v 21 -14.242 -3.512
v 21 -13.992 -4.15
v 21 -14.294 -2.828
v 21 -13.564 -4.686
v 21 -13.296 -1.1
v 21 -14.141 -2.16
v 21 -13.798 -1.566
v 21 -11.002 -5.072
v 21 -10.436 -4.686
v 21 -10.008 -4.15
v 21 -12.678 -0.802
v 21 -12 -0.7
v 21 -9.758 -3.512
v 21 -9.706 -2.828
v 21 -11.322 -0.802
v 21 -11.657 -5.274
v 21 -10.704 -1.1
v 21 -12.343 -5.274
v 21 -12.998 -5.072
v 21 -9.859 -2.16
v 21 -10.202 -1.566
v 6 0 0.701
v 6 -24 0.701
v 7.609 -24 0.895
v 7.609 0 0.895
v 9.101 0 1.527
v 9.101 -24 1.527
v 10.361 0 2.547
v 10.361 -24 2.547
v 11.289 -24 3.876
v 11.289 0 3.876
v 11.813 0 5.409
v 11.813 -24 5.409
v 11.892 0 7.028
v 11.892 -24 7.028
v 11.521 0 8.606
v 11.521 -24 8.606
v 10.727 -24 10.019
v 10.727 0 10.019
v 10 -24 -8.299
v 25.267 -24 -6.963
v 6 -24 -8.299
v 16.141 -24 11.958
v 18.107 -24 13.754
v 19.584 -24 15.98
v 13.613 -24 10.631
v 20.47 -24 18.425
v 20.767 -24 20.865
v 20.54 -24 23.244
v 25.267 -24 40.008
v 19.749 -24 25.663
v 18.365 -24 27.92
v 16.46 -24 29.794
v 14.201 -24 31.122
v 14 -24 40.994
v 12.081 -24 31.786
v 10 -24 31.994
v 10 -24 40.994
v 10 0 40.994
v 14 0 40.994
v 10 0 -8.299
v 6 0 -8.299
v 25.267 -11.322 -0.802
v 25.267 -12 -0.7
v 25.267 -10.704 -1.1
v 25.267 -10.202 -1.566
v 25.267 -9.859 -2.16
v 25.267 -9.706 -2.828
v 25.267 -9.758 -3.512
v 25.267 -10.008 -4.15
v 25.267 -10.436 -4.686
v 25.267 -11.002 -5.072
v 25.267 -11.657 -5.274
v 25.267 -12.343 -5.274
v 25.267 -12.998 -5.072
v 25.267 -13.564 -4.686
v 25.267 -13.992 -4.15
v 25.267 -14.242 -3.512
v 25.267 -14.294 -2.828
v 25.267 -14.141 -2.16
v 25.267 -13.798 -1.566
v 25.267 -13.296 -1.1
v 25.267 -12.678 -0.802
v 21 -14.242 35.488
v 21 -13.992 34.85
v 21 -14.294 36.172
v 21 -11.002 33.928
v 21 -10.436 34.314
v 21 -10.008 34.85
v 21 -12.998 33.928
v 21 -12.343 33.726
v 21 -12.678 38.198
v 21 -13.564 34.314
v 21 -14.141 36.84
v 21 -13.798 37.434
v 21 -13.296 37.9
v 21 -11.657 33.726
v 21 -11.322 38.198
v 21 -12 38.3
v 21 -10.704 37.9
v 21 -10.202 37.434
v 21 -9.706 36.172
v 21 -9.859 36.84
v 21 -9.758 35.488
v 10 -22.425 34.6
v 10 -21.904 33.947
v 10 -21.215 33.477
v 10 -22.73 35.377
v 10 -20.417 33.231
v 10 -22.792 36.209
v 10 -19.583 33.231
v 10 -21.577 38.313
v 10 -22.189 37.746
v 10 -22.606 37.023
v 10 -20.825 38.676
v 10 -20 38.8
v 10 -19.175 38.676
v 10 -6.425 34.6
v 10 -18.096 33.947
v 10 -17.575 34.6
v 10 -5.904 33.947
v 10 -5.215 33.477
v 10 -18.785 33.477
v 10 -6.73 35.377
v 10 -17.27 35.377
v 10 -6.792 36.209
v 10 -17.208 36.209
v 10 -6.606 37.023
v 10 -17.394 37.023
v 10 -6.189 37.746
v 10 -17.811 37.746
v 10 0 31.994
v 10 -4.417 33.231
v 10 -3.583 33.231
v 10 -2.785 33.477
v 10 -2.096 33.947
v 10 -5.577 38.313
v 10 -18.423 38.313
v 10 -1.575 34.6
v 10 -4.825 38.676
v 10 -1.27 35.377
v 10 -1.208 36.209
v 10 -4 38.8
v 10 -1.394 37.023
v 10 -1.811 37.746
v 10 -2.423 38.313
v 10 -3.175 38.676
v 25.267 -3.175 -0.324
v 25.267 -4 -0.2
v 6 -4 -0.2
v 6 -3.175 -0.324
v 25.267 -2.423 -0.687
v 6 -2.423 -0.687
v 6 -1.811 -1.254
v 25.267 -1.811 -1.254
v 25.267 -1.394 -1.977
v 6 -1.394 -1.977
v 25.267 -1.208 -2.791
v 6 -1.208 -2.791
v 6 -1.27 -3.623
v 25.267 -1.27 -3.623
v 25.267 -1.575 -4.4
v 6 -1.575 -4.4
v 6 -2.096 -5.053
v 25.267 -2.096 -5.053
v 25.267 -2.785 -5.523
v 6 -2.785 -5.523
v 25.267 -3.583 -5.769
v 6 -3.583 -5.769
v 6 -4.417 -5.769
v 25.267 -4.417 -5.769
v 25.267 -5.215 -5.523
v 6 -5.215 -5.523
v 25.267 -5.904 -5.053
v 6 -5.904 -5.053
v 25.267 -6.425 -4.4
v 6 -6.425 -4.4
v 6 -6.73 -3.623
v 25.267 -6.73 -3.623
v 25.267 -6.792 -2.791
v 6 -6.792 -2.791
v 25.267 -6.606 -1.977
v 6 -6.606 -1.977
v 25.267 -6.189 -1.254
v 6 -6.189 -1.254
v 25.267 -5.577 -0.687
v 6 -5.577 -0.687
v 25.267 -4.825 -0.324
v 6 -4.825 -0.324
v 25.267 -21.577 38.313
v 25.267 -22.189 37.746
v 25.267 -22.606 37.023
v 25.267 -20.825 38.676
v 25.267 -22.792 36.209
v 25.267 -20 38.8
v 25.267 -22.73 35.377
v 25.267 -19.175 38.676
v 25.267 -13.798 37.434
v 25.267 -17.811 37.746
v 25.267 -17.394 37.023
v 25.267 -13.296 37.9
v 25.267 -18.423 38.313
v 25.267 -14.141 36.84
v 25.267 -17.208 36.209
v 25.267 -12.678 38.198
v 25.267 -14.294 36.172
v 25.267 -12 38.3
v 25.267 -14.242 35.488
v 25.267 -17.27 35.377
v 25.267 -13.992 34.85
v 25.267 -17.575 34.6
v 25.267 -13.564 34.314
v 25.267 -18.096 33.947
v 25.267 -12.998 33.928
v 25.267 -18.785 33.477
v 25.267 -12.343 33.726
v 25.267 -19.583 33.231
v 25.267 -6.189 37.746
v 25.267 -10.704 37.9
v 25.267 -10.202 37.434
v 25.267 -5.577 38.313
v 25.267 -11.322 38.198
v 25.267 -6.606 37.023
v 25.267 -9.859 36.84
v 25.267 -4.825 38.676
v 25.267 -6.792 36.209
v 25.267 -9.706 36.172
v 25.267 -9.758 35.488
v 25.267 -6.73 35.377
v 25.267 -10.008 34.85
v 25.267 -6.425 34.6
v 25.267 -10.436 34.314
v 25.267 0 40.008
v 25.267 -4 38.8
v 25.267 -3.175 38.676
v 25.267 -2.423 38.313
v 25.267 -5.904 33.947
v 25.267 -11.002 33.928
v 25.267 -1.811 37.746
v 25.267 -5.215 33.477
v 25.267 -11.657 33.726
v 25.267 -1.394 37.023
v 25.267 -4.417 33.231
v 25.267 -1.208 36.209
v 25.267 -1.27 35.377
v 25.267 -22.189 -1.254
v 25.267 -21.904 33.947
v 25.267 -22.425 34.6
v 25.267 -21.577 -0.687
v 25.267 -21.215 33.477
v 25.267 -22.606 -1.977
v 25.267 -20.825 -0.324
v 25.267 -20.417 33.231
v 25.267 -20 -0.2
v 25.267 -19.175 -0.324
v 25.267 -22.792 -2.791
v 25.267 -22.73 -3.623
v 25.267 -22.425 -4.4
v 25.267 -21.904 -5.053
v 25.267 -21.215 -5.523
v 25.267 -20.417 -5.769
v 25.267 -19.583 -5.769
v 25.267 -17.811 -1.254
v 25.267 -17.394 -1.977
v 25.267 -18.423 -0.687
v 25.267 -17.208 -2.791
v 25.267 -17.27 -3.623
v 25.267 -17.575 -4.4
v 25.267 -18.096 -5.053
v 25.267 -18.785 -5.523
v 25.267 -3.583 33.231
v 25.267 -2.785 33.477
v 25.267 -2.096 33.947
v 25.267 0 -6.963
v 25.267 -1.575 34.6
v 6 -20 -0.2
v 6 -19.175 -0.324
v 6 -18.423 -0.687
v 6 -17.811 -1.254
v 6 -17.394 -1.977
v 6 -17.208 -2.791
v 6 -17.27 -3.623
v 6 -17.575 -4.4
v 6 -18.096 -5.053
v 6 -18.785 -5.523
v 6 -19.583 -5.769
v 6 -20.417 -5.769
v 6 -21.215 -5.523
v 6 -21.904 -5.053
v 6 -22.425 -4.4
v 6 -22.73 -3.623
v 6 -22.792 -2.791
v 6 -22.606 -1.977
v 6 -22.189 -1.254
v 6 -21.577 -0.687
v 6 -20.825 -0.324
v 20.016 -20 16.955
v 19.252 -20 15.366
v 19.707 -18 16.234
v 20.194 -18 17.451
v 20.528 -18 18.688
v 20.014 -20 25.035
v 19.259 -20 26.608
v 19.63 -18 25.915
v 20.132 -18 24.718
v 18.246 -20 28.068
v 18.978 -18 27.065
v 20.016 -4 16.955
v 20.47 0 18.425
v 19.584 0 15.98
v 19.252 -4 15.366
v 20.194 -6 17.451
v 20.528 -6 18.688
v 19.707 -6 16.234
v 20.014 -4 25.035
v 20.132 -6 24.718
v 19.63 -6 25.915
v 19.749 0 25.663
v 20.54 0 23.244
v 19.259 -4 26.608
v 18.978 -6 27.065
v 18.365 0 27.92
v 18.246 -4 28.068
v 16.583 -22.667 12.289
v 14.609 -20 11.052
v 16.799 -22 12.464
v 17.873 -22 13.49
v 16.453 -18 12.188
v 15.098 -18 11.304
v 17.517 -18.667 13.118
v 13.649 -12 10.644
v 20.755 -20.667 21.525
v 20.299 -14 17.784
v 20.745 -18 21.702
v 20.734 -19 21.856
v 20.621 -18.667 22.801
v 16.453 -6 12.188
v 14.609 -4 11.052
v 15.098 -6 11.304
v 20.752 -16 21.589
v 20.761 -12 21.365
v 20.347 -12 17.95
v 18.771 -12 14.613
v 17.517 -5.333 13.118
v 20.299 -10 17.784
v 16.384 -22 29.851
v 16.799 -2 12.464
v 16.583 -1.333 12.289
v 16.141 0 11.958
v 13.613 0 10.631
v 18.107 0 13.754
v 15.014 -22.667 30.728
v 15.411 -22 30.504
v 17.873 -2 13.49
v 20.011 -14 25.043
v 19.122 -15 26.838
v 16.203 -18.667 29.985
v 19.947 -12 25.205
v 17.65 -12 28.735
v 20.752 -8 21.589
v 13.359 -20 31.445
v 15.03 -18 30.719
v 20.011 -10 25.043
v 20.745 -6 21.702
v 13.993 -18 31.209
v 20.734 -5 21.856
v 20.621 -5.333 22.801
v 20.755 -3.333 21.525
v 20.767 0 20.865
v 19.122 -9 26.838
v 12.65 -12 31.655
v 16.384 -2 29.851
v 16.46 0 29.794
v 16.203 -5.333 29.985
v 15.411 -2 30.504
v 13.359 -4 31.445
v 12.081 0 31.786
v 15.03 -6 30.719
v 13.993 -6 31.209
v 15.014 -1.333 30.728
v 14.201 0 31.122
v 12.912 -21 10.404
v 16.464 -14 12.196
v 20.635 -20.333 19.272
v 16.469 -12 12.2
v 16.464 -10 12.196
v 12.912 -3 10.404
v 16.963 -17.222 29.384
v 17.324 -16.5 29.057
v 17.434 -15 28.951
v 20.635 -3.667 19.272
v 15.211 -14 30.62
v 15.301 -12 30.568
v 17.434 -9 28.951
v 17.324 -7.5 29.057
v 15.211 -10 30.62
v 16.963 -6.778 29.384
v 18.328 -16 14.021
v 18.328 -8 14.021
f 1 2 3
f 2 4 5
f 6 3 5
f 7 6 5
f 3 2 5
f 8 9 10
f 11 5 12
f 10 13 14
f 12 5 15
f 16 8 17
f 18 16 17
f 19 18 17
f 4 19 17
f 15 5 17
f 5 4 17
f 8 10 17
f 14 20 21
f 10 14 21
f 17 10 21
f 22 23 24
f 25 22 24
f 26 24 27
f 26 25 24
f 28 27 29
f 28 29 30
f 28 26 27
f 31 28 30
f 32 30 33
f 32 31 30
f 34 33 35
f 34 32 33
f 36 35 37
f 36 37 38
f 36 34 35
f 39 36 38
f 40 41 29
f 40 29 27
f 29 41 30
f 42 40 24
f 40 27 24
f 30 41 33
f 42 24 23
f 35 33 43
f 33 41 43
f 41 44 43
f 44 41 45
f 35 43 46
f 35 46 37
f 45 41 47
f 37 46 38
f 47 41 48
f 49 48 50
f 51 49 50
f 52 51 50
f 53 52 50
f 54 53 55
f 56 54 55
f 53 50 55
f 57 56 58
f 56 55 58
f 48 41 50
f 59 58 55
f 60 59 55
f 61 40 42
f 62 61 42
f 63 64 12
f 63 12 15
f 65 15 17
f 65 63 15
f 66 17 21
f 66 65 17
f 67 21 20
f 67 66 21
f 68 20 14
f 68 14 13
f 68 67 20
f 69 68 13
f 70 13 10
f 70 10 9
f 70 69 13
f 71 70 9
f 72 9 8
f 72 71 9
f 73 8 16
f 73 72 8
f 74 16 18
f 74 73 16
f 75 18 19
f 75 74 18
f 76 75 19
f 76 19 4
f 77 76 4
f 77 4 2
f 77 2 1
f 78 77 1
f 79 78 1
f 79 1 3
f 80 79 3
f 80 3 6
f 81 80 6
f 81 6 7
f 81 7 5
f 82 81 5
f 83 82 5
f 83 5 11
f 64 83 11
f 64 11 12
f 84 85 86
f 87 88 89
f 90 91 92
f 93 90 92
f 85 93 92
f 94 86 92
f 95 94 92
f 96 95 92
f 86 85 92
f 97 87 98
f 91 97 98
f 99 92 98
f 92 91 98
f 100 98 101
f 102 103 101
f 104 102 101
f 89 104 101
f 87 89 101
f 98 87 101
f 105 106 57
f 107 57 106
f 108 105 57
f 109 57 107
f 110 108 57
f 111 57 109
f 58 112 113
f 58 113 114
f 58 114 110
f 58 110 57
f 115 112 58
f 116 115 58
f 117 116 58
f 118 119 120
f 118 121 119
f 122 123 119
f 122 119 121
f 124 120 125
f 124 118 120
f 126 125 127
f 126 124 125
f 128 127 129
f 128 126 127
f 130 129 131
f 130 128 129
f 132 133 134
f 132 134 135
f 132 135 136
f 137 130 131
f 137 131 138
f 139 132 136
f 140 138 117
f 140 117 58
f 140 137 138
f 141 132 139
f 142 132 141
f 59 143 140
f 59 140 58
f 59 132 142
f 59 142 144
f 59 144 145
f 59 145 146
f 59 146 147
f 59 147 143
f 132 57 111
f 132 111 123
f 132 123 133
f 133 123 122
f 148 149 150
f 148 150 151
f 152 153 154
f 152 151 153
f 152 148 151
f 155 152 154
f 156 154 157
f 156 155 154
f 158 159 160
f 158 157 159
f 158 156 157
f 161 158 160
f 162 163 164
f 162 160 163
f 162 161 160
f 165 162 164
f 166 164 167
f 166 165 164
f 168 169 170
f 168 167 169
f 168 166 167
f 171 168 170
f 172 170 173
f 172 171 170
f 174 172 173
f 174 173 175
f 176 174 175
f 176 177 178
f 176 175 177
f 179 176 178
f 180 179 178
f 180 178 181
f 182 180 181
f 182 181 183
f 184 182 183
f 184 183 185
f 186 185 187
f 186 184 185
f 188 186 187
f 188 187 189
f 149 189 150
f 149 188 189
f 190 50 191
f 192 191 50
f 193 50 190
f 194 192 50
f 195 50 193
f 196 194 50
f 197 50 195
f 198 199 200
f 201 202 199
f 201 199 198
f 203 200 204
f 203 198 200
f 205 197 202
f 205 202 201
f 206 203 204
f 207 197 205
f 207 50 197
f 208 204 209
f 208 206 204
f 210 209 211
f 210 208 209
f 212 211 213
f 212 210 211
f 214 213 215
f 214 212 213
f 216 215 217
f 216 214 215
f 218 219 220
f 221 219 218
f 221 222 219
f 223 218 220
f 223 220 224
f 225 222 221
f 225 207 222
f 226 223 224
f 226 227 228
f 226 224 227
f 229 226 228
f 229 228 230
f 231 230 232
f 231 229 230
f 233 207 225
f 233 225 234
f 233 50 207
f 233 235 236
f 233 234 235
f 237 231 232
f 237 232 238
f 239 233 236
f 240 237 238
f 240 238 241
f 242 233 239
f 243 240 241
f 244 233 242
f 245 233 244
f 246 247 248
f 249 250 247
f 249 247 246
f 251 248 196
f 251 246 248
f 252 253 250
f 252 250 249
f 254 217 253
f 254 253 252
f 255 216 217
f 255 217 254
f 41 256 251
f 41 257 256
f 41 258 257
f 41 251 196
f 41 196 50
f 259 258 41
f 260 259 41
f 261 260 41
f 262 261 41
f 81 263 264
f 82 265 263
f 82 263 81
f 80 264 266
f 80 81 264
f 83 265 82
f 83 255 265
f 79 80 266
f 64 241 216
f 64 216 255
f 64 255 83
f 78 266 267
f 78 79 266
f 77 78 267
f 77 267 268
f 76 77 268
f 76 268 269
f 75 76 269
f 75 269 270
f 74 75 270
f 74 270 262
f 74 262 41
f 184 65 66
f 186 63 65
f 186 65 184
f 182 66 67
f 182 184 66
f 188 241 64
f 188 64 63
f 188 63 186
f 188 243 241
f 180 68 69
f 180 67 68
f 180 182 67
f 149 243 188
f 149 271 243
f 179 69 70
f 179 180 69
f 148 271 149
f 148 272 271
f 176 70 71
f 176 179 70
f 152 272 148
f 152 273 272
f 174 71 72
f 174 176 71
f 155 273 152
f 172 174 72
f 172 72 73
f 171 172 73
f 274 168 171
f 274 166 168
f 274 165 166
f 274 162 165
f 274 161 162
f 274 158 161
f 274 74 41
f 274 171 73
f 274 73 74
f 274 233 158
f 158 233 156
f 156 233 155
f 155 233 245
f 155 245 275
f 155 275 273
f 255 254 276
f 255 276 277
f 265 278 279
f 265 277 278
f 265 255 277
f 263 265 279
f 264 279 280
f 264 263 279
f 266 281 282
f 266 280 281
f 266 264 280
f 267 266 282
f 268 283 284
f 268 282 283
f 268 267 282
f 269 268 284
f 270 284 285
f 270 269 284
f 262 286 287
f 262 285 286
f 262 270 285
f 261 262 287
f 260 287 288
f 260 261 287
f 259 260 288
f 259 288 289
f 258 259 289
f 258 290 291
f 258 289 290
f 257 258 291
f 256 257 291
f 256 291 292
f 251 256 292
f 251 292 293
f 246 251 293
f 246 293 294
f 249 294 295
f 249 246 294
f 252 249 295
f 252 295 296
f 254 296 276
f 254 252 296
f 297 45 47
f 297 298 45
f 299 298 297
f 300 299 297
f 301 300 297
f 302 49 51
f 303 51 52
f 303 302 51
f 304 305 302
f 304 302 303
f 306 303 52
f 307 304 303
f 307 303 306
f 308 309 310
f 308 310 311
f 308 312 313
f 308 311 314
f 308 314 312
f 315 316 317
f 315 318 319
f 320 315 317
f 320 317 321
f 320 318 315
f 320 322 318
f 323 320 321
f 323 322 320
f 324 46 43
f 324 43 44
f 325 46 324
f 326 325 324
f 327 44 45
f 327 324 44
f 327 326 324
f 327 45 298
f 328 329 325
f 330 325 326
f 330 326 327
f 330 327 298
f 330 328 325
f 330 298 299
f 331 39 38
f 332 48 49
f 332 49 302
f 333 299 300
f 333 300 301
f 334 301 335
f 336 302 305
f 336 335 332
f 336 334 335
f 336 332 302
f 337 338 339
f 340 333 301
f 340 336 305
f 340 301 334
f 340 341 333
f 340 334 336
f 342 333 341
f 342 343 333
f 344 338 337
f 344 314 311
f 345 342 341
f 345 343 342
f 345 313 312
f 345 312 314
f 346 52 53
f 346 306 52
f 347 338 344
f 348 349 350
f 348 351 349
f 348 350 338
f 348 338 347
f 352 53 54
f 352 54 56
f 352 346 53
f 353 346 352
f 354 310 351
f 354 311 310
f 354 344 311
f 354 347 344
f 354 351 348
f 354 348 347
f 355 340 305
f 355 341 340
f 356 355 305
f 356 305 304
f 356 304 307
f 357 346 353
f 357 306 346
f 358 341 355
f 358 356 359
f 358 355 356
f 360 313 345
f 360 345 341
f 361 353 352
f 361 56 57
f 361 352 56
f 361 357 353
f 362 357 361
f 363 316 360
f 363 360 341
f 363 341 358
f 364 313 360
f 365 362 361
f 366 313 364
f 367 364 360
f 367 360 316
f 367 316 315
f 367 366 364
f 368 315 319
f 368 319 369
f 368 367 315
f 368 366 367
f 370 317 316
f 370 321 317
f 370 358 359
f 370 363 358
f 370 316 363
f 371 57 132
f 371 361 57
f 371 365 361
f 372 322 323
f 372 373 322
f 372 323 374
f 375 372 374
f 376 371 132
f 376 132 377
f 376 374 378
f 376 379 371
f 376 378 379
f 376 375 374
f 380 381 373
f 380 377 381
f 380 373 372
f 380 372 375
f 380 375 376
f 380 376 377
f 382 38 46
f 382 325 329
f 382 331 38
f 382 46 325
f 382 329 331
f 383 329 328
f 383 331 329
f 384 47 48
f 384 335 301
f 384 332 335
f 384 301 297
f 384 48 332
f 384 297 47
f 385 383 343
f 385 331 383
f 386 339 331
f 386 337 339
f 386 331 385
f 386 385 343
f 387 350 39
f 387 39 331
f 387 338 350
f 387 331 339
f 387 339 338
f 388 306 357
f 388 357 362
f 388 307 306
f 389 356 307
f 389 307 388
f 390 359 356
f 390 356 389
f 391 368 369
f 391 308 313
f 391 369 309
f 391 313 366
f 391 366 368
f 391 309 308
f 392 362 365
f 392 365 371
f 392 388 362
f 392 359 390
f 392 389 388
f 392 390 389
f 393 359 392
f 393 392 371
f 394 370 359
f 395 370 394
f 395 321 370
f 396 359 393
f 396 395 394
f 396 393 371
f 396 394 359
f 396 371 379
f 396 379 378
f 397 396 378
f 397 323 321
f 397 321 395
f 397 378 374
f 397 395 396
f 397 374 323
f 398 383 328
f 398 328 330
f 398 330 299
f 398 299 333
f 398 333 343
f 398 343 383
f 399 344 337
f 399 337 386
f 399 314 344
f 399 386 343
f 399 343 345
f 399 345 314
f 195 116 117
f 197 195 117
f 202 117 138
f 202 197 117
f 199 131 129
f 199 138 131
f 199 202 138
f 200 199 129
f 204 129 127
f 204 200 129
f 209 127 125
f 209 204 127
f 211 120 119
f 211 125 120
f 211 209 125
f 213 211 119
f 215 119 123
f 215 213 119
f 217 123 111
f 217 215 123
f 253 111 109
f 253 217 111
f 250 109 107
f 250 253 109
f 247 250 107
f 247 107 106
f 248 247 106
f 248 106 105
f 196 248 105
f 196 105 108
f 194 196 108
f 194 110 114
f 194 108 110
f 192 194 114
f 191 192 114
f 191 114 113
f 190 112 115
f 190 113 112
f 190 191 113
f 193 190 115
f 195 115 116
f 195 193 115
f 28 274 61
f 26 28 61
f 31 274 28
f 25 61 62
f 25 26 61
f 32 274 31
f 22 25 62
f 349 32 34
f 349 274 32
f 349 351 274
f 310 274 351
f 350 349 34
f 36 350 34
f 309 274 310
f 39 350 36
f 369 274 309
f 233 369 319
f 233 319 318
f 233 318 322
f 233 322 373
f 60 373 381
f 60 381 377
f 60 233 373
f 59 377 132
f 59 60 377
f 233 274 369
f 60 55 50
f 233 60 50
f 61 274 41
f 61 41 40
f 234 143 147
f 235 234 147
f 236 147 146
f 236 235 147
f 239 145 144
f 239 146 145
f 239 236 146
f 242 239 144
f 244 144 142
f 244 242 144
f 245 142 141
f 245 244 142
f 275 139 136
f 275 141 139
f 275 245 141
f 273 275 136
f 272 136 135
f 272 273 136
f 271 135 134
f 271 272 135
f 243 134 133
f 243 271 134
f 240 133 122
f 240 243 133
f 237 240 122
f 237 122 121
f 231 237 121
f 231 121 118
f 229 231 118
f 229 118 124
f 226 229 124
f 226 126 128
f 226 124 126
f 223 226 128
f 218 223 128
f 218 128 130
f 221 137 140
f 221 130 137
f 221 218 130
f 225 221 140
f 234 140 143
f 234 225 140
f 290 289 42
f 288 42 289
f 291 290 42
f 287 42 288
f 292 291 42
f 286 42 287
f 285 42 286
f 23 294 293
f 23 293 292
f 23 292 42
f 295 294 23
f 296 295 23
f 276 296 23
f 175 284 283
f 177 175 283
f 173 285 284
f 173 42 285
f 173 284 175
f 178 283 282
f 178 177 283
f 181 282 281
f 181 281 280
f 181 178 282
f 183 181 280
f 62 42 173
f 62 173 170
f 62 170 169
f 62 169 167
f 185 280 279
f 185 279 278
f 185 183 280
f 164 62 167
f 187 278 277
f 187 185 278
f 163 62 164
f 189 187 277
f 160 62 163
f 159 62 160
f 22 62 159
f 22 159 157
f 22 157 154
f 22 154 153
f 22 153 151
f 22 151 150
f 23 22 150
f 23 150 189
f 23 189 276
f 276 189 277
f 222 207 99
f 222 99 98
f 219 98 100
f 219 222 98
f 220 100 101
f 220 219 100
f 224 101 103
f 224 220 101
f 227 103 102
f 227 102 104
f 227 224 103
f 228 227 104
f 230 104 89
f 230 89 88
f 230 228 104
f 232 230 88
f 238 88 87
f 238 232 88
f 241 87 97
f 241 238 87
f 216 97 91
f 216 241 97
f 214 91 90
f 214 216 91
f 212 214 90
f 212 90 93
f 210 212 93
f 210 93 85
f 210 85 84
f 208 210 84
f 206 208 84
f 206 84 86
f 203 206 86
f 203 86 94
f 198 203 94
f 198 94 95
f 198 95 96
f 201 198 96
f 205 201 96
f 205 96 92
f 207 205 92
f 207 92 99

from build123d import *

# Parameters (mm, degrees)
CYLINDER014_R     = 2.3
CYLINDER014_DEPTH = 20
CYLINDER015_R     = 2.3
CYLINDER015_DEPTH = 20
CYLINDER004_R     = 2.8
CYLINDER004_DEPTH = 60
CYLINDER005_R     = 2.8
CYLINDER005_DEPTH = 60
CYLINDER006_R     = 2.8
CYLINDER006_DEPTH = 60
CYLINDER007_R     = 2.8
CYLINDER007_DEPTH = 60
PAD003_DEPTH      = 24


with BuildPart() as passi_kl_wi0:
    # Cylinder014 → Cylinder014 (new body)
    with BuildSketch(Plane(origin=(41, -12, -3), x_dir=(0, 0, 1), z_dir=(-1, 0, 0))):
        Circle(CYLINDER014_R)
    extrude(amount=CYLINDER014_DEPTH)


with BuildPart() as passi_kl_wi1:
    # Cylinder015 → Cylinder015 (new body)
    with BuildSketch(Plane(origin=(41, -12, 36), x_dir=(0, 0, 1), z_dir=(-1, 0, 0))):
        Circle(CYLINDER015_R)
    extrude(amount=CYLINDER015_DEPTH)


with BuildPart() as o003:
    # Cylinder004 → Cylinder004 (new body)
    with BuildSketch(Plane(origin=(41, -4, 36), x_dir=(0, 0, 1), z_dir=(-1, 0, 0))):
        Circle(CYLINDER004_R)
    extrude(amount=CYLINDER004_DEPTH)


with BuildPart() as u003:
    # Cylinder005 → Cylinder005 (new body)
    with BuildSketch(Plane(origin=(41, -20, -3), x_dir=(0, 0, 1), z_dir=(-1, 0, 0))):
        Circle(CYLINDER005_R)
    extrude(amount=CYLINDER005_DEPTH)


with BuildPart() as u004:
    # Cylinder006 → Cylinder006 (new body)
    with BuildSketch(Plane(origin=(41, -4, -3), x_dir=(0, 0, 1), z_dir=(-1, 0, 0))):
        Circle(CYLINDER006_R)
    extrude(amount=CYLINDER006_DEPTH)


with BuildPart() as o004:
    # Cylinder007 → Cylinder007 (new body)
    with BuildSketch(Plane(origin=(41, -20, 36), x_dir=(0, 0, 1), z_dir=(-1, 0, 0))):
        Circle(CYLINDER007_R)
    extrude(amount=CYLINDER007_DEPTH)


with BuildPart() as cut020:
    # Sketch003 → Pad003 (new body)
    with BuildSketch(Plane.XZ):
        with BuildLine():
            ThreePointArc((6, 0.701169), (11.288851, 3.875794), (10.727222, 10.018656))
            add(Edge.make_bspline(
                [(10.727222, 10.018656), (21.113006, 10.736894), (20.761279, 21.365217), (20.409553, 31.993539), (10, 31.993539)],
                knots=[3.209183, 3.209183, 3.209183, 4.746184, 4.746184, 6.283185, 6.283185, 6.283185], degree=2, weights=[1, 0.718954, 1, 0.718954, 1]))
            Line((10, 31.993539), (10, 40.993539))
            Line((10, 40.993539), (14, 40.993539))
            Line((14, 40.993539), (25.267428, 40.007767))
            Line((25.267428, 40.007767), (25.267428, -6.963104))
            Line((25.267428, -6.963104), (10, -8.298831))
            Line((10, -8.298831), (6, -8.298831))
            Line((6, -8.298831), (6, 0.701169))
        make_face()
    extrude(amount=PAD003_DEPTH)

    # Cut015: cut O004
    add(o004.part, mode=Mode.SUBTRACT)

    # Cut016: cut U004
    add(u004.part, mode=Mode.SUBTRACT)

    # Cut017: cut U003
    add(u003.part, mode=Mode.SUBTRACT)

    # Cut018: cut O003
    add(o003.part, mode=Mode.SUBTRACT)

    # Cut019: cut PassI_Kl-Wi1
    add(passi_kl_wi1.part, mode=Mode.SUBTRACT)

    # Cut020: cut PassI_Kl-Wi0
    add(passi_kl_wi0.part, mode=Mode.SUBTRACT)


solid = cut020.part
